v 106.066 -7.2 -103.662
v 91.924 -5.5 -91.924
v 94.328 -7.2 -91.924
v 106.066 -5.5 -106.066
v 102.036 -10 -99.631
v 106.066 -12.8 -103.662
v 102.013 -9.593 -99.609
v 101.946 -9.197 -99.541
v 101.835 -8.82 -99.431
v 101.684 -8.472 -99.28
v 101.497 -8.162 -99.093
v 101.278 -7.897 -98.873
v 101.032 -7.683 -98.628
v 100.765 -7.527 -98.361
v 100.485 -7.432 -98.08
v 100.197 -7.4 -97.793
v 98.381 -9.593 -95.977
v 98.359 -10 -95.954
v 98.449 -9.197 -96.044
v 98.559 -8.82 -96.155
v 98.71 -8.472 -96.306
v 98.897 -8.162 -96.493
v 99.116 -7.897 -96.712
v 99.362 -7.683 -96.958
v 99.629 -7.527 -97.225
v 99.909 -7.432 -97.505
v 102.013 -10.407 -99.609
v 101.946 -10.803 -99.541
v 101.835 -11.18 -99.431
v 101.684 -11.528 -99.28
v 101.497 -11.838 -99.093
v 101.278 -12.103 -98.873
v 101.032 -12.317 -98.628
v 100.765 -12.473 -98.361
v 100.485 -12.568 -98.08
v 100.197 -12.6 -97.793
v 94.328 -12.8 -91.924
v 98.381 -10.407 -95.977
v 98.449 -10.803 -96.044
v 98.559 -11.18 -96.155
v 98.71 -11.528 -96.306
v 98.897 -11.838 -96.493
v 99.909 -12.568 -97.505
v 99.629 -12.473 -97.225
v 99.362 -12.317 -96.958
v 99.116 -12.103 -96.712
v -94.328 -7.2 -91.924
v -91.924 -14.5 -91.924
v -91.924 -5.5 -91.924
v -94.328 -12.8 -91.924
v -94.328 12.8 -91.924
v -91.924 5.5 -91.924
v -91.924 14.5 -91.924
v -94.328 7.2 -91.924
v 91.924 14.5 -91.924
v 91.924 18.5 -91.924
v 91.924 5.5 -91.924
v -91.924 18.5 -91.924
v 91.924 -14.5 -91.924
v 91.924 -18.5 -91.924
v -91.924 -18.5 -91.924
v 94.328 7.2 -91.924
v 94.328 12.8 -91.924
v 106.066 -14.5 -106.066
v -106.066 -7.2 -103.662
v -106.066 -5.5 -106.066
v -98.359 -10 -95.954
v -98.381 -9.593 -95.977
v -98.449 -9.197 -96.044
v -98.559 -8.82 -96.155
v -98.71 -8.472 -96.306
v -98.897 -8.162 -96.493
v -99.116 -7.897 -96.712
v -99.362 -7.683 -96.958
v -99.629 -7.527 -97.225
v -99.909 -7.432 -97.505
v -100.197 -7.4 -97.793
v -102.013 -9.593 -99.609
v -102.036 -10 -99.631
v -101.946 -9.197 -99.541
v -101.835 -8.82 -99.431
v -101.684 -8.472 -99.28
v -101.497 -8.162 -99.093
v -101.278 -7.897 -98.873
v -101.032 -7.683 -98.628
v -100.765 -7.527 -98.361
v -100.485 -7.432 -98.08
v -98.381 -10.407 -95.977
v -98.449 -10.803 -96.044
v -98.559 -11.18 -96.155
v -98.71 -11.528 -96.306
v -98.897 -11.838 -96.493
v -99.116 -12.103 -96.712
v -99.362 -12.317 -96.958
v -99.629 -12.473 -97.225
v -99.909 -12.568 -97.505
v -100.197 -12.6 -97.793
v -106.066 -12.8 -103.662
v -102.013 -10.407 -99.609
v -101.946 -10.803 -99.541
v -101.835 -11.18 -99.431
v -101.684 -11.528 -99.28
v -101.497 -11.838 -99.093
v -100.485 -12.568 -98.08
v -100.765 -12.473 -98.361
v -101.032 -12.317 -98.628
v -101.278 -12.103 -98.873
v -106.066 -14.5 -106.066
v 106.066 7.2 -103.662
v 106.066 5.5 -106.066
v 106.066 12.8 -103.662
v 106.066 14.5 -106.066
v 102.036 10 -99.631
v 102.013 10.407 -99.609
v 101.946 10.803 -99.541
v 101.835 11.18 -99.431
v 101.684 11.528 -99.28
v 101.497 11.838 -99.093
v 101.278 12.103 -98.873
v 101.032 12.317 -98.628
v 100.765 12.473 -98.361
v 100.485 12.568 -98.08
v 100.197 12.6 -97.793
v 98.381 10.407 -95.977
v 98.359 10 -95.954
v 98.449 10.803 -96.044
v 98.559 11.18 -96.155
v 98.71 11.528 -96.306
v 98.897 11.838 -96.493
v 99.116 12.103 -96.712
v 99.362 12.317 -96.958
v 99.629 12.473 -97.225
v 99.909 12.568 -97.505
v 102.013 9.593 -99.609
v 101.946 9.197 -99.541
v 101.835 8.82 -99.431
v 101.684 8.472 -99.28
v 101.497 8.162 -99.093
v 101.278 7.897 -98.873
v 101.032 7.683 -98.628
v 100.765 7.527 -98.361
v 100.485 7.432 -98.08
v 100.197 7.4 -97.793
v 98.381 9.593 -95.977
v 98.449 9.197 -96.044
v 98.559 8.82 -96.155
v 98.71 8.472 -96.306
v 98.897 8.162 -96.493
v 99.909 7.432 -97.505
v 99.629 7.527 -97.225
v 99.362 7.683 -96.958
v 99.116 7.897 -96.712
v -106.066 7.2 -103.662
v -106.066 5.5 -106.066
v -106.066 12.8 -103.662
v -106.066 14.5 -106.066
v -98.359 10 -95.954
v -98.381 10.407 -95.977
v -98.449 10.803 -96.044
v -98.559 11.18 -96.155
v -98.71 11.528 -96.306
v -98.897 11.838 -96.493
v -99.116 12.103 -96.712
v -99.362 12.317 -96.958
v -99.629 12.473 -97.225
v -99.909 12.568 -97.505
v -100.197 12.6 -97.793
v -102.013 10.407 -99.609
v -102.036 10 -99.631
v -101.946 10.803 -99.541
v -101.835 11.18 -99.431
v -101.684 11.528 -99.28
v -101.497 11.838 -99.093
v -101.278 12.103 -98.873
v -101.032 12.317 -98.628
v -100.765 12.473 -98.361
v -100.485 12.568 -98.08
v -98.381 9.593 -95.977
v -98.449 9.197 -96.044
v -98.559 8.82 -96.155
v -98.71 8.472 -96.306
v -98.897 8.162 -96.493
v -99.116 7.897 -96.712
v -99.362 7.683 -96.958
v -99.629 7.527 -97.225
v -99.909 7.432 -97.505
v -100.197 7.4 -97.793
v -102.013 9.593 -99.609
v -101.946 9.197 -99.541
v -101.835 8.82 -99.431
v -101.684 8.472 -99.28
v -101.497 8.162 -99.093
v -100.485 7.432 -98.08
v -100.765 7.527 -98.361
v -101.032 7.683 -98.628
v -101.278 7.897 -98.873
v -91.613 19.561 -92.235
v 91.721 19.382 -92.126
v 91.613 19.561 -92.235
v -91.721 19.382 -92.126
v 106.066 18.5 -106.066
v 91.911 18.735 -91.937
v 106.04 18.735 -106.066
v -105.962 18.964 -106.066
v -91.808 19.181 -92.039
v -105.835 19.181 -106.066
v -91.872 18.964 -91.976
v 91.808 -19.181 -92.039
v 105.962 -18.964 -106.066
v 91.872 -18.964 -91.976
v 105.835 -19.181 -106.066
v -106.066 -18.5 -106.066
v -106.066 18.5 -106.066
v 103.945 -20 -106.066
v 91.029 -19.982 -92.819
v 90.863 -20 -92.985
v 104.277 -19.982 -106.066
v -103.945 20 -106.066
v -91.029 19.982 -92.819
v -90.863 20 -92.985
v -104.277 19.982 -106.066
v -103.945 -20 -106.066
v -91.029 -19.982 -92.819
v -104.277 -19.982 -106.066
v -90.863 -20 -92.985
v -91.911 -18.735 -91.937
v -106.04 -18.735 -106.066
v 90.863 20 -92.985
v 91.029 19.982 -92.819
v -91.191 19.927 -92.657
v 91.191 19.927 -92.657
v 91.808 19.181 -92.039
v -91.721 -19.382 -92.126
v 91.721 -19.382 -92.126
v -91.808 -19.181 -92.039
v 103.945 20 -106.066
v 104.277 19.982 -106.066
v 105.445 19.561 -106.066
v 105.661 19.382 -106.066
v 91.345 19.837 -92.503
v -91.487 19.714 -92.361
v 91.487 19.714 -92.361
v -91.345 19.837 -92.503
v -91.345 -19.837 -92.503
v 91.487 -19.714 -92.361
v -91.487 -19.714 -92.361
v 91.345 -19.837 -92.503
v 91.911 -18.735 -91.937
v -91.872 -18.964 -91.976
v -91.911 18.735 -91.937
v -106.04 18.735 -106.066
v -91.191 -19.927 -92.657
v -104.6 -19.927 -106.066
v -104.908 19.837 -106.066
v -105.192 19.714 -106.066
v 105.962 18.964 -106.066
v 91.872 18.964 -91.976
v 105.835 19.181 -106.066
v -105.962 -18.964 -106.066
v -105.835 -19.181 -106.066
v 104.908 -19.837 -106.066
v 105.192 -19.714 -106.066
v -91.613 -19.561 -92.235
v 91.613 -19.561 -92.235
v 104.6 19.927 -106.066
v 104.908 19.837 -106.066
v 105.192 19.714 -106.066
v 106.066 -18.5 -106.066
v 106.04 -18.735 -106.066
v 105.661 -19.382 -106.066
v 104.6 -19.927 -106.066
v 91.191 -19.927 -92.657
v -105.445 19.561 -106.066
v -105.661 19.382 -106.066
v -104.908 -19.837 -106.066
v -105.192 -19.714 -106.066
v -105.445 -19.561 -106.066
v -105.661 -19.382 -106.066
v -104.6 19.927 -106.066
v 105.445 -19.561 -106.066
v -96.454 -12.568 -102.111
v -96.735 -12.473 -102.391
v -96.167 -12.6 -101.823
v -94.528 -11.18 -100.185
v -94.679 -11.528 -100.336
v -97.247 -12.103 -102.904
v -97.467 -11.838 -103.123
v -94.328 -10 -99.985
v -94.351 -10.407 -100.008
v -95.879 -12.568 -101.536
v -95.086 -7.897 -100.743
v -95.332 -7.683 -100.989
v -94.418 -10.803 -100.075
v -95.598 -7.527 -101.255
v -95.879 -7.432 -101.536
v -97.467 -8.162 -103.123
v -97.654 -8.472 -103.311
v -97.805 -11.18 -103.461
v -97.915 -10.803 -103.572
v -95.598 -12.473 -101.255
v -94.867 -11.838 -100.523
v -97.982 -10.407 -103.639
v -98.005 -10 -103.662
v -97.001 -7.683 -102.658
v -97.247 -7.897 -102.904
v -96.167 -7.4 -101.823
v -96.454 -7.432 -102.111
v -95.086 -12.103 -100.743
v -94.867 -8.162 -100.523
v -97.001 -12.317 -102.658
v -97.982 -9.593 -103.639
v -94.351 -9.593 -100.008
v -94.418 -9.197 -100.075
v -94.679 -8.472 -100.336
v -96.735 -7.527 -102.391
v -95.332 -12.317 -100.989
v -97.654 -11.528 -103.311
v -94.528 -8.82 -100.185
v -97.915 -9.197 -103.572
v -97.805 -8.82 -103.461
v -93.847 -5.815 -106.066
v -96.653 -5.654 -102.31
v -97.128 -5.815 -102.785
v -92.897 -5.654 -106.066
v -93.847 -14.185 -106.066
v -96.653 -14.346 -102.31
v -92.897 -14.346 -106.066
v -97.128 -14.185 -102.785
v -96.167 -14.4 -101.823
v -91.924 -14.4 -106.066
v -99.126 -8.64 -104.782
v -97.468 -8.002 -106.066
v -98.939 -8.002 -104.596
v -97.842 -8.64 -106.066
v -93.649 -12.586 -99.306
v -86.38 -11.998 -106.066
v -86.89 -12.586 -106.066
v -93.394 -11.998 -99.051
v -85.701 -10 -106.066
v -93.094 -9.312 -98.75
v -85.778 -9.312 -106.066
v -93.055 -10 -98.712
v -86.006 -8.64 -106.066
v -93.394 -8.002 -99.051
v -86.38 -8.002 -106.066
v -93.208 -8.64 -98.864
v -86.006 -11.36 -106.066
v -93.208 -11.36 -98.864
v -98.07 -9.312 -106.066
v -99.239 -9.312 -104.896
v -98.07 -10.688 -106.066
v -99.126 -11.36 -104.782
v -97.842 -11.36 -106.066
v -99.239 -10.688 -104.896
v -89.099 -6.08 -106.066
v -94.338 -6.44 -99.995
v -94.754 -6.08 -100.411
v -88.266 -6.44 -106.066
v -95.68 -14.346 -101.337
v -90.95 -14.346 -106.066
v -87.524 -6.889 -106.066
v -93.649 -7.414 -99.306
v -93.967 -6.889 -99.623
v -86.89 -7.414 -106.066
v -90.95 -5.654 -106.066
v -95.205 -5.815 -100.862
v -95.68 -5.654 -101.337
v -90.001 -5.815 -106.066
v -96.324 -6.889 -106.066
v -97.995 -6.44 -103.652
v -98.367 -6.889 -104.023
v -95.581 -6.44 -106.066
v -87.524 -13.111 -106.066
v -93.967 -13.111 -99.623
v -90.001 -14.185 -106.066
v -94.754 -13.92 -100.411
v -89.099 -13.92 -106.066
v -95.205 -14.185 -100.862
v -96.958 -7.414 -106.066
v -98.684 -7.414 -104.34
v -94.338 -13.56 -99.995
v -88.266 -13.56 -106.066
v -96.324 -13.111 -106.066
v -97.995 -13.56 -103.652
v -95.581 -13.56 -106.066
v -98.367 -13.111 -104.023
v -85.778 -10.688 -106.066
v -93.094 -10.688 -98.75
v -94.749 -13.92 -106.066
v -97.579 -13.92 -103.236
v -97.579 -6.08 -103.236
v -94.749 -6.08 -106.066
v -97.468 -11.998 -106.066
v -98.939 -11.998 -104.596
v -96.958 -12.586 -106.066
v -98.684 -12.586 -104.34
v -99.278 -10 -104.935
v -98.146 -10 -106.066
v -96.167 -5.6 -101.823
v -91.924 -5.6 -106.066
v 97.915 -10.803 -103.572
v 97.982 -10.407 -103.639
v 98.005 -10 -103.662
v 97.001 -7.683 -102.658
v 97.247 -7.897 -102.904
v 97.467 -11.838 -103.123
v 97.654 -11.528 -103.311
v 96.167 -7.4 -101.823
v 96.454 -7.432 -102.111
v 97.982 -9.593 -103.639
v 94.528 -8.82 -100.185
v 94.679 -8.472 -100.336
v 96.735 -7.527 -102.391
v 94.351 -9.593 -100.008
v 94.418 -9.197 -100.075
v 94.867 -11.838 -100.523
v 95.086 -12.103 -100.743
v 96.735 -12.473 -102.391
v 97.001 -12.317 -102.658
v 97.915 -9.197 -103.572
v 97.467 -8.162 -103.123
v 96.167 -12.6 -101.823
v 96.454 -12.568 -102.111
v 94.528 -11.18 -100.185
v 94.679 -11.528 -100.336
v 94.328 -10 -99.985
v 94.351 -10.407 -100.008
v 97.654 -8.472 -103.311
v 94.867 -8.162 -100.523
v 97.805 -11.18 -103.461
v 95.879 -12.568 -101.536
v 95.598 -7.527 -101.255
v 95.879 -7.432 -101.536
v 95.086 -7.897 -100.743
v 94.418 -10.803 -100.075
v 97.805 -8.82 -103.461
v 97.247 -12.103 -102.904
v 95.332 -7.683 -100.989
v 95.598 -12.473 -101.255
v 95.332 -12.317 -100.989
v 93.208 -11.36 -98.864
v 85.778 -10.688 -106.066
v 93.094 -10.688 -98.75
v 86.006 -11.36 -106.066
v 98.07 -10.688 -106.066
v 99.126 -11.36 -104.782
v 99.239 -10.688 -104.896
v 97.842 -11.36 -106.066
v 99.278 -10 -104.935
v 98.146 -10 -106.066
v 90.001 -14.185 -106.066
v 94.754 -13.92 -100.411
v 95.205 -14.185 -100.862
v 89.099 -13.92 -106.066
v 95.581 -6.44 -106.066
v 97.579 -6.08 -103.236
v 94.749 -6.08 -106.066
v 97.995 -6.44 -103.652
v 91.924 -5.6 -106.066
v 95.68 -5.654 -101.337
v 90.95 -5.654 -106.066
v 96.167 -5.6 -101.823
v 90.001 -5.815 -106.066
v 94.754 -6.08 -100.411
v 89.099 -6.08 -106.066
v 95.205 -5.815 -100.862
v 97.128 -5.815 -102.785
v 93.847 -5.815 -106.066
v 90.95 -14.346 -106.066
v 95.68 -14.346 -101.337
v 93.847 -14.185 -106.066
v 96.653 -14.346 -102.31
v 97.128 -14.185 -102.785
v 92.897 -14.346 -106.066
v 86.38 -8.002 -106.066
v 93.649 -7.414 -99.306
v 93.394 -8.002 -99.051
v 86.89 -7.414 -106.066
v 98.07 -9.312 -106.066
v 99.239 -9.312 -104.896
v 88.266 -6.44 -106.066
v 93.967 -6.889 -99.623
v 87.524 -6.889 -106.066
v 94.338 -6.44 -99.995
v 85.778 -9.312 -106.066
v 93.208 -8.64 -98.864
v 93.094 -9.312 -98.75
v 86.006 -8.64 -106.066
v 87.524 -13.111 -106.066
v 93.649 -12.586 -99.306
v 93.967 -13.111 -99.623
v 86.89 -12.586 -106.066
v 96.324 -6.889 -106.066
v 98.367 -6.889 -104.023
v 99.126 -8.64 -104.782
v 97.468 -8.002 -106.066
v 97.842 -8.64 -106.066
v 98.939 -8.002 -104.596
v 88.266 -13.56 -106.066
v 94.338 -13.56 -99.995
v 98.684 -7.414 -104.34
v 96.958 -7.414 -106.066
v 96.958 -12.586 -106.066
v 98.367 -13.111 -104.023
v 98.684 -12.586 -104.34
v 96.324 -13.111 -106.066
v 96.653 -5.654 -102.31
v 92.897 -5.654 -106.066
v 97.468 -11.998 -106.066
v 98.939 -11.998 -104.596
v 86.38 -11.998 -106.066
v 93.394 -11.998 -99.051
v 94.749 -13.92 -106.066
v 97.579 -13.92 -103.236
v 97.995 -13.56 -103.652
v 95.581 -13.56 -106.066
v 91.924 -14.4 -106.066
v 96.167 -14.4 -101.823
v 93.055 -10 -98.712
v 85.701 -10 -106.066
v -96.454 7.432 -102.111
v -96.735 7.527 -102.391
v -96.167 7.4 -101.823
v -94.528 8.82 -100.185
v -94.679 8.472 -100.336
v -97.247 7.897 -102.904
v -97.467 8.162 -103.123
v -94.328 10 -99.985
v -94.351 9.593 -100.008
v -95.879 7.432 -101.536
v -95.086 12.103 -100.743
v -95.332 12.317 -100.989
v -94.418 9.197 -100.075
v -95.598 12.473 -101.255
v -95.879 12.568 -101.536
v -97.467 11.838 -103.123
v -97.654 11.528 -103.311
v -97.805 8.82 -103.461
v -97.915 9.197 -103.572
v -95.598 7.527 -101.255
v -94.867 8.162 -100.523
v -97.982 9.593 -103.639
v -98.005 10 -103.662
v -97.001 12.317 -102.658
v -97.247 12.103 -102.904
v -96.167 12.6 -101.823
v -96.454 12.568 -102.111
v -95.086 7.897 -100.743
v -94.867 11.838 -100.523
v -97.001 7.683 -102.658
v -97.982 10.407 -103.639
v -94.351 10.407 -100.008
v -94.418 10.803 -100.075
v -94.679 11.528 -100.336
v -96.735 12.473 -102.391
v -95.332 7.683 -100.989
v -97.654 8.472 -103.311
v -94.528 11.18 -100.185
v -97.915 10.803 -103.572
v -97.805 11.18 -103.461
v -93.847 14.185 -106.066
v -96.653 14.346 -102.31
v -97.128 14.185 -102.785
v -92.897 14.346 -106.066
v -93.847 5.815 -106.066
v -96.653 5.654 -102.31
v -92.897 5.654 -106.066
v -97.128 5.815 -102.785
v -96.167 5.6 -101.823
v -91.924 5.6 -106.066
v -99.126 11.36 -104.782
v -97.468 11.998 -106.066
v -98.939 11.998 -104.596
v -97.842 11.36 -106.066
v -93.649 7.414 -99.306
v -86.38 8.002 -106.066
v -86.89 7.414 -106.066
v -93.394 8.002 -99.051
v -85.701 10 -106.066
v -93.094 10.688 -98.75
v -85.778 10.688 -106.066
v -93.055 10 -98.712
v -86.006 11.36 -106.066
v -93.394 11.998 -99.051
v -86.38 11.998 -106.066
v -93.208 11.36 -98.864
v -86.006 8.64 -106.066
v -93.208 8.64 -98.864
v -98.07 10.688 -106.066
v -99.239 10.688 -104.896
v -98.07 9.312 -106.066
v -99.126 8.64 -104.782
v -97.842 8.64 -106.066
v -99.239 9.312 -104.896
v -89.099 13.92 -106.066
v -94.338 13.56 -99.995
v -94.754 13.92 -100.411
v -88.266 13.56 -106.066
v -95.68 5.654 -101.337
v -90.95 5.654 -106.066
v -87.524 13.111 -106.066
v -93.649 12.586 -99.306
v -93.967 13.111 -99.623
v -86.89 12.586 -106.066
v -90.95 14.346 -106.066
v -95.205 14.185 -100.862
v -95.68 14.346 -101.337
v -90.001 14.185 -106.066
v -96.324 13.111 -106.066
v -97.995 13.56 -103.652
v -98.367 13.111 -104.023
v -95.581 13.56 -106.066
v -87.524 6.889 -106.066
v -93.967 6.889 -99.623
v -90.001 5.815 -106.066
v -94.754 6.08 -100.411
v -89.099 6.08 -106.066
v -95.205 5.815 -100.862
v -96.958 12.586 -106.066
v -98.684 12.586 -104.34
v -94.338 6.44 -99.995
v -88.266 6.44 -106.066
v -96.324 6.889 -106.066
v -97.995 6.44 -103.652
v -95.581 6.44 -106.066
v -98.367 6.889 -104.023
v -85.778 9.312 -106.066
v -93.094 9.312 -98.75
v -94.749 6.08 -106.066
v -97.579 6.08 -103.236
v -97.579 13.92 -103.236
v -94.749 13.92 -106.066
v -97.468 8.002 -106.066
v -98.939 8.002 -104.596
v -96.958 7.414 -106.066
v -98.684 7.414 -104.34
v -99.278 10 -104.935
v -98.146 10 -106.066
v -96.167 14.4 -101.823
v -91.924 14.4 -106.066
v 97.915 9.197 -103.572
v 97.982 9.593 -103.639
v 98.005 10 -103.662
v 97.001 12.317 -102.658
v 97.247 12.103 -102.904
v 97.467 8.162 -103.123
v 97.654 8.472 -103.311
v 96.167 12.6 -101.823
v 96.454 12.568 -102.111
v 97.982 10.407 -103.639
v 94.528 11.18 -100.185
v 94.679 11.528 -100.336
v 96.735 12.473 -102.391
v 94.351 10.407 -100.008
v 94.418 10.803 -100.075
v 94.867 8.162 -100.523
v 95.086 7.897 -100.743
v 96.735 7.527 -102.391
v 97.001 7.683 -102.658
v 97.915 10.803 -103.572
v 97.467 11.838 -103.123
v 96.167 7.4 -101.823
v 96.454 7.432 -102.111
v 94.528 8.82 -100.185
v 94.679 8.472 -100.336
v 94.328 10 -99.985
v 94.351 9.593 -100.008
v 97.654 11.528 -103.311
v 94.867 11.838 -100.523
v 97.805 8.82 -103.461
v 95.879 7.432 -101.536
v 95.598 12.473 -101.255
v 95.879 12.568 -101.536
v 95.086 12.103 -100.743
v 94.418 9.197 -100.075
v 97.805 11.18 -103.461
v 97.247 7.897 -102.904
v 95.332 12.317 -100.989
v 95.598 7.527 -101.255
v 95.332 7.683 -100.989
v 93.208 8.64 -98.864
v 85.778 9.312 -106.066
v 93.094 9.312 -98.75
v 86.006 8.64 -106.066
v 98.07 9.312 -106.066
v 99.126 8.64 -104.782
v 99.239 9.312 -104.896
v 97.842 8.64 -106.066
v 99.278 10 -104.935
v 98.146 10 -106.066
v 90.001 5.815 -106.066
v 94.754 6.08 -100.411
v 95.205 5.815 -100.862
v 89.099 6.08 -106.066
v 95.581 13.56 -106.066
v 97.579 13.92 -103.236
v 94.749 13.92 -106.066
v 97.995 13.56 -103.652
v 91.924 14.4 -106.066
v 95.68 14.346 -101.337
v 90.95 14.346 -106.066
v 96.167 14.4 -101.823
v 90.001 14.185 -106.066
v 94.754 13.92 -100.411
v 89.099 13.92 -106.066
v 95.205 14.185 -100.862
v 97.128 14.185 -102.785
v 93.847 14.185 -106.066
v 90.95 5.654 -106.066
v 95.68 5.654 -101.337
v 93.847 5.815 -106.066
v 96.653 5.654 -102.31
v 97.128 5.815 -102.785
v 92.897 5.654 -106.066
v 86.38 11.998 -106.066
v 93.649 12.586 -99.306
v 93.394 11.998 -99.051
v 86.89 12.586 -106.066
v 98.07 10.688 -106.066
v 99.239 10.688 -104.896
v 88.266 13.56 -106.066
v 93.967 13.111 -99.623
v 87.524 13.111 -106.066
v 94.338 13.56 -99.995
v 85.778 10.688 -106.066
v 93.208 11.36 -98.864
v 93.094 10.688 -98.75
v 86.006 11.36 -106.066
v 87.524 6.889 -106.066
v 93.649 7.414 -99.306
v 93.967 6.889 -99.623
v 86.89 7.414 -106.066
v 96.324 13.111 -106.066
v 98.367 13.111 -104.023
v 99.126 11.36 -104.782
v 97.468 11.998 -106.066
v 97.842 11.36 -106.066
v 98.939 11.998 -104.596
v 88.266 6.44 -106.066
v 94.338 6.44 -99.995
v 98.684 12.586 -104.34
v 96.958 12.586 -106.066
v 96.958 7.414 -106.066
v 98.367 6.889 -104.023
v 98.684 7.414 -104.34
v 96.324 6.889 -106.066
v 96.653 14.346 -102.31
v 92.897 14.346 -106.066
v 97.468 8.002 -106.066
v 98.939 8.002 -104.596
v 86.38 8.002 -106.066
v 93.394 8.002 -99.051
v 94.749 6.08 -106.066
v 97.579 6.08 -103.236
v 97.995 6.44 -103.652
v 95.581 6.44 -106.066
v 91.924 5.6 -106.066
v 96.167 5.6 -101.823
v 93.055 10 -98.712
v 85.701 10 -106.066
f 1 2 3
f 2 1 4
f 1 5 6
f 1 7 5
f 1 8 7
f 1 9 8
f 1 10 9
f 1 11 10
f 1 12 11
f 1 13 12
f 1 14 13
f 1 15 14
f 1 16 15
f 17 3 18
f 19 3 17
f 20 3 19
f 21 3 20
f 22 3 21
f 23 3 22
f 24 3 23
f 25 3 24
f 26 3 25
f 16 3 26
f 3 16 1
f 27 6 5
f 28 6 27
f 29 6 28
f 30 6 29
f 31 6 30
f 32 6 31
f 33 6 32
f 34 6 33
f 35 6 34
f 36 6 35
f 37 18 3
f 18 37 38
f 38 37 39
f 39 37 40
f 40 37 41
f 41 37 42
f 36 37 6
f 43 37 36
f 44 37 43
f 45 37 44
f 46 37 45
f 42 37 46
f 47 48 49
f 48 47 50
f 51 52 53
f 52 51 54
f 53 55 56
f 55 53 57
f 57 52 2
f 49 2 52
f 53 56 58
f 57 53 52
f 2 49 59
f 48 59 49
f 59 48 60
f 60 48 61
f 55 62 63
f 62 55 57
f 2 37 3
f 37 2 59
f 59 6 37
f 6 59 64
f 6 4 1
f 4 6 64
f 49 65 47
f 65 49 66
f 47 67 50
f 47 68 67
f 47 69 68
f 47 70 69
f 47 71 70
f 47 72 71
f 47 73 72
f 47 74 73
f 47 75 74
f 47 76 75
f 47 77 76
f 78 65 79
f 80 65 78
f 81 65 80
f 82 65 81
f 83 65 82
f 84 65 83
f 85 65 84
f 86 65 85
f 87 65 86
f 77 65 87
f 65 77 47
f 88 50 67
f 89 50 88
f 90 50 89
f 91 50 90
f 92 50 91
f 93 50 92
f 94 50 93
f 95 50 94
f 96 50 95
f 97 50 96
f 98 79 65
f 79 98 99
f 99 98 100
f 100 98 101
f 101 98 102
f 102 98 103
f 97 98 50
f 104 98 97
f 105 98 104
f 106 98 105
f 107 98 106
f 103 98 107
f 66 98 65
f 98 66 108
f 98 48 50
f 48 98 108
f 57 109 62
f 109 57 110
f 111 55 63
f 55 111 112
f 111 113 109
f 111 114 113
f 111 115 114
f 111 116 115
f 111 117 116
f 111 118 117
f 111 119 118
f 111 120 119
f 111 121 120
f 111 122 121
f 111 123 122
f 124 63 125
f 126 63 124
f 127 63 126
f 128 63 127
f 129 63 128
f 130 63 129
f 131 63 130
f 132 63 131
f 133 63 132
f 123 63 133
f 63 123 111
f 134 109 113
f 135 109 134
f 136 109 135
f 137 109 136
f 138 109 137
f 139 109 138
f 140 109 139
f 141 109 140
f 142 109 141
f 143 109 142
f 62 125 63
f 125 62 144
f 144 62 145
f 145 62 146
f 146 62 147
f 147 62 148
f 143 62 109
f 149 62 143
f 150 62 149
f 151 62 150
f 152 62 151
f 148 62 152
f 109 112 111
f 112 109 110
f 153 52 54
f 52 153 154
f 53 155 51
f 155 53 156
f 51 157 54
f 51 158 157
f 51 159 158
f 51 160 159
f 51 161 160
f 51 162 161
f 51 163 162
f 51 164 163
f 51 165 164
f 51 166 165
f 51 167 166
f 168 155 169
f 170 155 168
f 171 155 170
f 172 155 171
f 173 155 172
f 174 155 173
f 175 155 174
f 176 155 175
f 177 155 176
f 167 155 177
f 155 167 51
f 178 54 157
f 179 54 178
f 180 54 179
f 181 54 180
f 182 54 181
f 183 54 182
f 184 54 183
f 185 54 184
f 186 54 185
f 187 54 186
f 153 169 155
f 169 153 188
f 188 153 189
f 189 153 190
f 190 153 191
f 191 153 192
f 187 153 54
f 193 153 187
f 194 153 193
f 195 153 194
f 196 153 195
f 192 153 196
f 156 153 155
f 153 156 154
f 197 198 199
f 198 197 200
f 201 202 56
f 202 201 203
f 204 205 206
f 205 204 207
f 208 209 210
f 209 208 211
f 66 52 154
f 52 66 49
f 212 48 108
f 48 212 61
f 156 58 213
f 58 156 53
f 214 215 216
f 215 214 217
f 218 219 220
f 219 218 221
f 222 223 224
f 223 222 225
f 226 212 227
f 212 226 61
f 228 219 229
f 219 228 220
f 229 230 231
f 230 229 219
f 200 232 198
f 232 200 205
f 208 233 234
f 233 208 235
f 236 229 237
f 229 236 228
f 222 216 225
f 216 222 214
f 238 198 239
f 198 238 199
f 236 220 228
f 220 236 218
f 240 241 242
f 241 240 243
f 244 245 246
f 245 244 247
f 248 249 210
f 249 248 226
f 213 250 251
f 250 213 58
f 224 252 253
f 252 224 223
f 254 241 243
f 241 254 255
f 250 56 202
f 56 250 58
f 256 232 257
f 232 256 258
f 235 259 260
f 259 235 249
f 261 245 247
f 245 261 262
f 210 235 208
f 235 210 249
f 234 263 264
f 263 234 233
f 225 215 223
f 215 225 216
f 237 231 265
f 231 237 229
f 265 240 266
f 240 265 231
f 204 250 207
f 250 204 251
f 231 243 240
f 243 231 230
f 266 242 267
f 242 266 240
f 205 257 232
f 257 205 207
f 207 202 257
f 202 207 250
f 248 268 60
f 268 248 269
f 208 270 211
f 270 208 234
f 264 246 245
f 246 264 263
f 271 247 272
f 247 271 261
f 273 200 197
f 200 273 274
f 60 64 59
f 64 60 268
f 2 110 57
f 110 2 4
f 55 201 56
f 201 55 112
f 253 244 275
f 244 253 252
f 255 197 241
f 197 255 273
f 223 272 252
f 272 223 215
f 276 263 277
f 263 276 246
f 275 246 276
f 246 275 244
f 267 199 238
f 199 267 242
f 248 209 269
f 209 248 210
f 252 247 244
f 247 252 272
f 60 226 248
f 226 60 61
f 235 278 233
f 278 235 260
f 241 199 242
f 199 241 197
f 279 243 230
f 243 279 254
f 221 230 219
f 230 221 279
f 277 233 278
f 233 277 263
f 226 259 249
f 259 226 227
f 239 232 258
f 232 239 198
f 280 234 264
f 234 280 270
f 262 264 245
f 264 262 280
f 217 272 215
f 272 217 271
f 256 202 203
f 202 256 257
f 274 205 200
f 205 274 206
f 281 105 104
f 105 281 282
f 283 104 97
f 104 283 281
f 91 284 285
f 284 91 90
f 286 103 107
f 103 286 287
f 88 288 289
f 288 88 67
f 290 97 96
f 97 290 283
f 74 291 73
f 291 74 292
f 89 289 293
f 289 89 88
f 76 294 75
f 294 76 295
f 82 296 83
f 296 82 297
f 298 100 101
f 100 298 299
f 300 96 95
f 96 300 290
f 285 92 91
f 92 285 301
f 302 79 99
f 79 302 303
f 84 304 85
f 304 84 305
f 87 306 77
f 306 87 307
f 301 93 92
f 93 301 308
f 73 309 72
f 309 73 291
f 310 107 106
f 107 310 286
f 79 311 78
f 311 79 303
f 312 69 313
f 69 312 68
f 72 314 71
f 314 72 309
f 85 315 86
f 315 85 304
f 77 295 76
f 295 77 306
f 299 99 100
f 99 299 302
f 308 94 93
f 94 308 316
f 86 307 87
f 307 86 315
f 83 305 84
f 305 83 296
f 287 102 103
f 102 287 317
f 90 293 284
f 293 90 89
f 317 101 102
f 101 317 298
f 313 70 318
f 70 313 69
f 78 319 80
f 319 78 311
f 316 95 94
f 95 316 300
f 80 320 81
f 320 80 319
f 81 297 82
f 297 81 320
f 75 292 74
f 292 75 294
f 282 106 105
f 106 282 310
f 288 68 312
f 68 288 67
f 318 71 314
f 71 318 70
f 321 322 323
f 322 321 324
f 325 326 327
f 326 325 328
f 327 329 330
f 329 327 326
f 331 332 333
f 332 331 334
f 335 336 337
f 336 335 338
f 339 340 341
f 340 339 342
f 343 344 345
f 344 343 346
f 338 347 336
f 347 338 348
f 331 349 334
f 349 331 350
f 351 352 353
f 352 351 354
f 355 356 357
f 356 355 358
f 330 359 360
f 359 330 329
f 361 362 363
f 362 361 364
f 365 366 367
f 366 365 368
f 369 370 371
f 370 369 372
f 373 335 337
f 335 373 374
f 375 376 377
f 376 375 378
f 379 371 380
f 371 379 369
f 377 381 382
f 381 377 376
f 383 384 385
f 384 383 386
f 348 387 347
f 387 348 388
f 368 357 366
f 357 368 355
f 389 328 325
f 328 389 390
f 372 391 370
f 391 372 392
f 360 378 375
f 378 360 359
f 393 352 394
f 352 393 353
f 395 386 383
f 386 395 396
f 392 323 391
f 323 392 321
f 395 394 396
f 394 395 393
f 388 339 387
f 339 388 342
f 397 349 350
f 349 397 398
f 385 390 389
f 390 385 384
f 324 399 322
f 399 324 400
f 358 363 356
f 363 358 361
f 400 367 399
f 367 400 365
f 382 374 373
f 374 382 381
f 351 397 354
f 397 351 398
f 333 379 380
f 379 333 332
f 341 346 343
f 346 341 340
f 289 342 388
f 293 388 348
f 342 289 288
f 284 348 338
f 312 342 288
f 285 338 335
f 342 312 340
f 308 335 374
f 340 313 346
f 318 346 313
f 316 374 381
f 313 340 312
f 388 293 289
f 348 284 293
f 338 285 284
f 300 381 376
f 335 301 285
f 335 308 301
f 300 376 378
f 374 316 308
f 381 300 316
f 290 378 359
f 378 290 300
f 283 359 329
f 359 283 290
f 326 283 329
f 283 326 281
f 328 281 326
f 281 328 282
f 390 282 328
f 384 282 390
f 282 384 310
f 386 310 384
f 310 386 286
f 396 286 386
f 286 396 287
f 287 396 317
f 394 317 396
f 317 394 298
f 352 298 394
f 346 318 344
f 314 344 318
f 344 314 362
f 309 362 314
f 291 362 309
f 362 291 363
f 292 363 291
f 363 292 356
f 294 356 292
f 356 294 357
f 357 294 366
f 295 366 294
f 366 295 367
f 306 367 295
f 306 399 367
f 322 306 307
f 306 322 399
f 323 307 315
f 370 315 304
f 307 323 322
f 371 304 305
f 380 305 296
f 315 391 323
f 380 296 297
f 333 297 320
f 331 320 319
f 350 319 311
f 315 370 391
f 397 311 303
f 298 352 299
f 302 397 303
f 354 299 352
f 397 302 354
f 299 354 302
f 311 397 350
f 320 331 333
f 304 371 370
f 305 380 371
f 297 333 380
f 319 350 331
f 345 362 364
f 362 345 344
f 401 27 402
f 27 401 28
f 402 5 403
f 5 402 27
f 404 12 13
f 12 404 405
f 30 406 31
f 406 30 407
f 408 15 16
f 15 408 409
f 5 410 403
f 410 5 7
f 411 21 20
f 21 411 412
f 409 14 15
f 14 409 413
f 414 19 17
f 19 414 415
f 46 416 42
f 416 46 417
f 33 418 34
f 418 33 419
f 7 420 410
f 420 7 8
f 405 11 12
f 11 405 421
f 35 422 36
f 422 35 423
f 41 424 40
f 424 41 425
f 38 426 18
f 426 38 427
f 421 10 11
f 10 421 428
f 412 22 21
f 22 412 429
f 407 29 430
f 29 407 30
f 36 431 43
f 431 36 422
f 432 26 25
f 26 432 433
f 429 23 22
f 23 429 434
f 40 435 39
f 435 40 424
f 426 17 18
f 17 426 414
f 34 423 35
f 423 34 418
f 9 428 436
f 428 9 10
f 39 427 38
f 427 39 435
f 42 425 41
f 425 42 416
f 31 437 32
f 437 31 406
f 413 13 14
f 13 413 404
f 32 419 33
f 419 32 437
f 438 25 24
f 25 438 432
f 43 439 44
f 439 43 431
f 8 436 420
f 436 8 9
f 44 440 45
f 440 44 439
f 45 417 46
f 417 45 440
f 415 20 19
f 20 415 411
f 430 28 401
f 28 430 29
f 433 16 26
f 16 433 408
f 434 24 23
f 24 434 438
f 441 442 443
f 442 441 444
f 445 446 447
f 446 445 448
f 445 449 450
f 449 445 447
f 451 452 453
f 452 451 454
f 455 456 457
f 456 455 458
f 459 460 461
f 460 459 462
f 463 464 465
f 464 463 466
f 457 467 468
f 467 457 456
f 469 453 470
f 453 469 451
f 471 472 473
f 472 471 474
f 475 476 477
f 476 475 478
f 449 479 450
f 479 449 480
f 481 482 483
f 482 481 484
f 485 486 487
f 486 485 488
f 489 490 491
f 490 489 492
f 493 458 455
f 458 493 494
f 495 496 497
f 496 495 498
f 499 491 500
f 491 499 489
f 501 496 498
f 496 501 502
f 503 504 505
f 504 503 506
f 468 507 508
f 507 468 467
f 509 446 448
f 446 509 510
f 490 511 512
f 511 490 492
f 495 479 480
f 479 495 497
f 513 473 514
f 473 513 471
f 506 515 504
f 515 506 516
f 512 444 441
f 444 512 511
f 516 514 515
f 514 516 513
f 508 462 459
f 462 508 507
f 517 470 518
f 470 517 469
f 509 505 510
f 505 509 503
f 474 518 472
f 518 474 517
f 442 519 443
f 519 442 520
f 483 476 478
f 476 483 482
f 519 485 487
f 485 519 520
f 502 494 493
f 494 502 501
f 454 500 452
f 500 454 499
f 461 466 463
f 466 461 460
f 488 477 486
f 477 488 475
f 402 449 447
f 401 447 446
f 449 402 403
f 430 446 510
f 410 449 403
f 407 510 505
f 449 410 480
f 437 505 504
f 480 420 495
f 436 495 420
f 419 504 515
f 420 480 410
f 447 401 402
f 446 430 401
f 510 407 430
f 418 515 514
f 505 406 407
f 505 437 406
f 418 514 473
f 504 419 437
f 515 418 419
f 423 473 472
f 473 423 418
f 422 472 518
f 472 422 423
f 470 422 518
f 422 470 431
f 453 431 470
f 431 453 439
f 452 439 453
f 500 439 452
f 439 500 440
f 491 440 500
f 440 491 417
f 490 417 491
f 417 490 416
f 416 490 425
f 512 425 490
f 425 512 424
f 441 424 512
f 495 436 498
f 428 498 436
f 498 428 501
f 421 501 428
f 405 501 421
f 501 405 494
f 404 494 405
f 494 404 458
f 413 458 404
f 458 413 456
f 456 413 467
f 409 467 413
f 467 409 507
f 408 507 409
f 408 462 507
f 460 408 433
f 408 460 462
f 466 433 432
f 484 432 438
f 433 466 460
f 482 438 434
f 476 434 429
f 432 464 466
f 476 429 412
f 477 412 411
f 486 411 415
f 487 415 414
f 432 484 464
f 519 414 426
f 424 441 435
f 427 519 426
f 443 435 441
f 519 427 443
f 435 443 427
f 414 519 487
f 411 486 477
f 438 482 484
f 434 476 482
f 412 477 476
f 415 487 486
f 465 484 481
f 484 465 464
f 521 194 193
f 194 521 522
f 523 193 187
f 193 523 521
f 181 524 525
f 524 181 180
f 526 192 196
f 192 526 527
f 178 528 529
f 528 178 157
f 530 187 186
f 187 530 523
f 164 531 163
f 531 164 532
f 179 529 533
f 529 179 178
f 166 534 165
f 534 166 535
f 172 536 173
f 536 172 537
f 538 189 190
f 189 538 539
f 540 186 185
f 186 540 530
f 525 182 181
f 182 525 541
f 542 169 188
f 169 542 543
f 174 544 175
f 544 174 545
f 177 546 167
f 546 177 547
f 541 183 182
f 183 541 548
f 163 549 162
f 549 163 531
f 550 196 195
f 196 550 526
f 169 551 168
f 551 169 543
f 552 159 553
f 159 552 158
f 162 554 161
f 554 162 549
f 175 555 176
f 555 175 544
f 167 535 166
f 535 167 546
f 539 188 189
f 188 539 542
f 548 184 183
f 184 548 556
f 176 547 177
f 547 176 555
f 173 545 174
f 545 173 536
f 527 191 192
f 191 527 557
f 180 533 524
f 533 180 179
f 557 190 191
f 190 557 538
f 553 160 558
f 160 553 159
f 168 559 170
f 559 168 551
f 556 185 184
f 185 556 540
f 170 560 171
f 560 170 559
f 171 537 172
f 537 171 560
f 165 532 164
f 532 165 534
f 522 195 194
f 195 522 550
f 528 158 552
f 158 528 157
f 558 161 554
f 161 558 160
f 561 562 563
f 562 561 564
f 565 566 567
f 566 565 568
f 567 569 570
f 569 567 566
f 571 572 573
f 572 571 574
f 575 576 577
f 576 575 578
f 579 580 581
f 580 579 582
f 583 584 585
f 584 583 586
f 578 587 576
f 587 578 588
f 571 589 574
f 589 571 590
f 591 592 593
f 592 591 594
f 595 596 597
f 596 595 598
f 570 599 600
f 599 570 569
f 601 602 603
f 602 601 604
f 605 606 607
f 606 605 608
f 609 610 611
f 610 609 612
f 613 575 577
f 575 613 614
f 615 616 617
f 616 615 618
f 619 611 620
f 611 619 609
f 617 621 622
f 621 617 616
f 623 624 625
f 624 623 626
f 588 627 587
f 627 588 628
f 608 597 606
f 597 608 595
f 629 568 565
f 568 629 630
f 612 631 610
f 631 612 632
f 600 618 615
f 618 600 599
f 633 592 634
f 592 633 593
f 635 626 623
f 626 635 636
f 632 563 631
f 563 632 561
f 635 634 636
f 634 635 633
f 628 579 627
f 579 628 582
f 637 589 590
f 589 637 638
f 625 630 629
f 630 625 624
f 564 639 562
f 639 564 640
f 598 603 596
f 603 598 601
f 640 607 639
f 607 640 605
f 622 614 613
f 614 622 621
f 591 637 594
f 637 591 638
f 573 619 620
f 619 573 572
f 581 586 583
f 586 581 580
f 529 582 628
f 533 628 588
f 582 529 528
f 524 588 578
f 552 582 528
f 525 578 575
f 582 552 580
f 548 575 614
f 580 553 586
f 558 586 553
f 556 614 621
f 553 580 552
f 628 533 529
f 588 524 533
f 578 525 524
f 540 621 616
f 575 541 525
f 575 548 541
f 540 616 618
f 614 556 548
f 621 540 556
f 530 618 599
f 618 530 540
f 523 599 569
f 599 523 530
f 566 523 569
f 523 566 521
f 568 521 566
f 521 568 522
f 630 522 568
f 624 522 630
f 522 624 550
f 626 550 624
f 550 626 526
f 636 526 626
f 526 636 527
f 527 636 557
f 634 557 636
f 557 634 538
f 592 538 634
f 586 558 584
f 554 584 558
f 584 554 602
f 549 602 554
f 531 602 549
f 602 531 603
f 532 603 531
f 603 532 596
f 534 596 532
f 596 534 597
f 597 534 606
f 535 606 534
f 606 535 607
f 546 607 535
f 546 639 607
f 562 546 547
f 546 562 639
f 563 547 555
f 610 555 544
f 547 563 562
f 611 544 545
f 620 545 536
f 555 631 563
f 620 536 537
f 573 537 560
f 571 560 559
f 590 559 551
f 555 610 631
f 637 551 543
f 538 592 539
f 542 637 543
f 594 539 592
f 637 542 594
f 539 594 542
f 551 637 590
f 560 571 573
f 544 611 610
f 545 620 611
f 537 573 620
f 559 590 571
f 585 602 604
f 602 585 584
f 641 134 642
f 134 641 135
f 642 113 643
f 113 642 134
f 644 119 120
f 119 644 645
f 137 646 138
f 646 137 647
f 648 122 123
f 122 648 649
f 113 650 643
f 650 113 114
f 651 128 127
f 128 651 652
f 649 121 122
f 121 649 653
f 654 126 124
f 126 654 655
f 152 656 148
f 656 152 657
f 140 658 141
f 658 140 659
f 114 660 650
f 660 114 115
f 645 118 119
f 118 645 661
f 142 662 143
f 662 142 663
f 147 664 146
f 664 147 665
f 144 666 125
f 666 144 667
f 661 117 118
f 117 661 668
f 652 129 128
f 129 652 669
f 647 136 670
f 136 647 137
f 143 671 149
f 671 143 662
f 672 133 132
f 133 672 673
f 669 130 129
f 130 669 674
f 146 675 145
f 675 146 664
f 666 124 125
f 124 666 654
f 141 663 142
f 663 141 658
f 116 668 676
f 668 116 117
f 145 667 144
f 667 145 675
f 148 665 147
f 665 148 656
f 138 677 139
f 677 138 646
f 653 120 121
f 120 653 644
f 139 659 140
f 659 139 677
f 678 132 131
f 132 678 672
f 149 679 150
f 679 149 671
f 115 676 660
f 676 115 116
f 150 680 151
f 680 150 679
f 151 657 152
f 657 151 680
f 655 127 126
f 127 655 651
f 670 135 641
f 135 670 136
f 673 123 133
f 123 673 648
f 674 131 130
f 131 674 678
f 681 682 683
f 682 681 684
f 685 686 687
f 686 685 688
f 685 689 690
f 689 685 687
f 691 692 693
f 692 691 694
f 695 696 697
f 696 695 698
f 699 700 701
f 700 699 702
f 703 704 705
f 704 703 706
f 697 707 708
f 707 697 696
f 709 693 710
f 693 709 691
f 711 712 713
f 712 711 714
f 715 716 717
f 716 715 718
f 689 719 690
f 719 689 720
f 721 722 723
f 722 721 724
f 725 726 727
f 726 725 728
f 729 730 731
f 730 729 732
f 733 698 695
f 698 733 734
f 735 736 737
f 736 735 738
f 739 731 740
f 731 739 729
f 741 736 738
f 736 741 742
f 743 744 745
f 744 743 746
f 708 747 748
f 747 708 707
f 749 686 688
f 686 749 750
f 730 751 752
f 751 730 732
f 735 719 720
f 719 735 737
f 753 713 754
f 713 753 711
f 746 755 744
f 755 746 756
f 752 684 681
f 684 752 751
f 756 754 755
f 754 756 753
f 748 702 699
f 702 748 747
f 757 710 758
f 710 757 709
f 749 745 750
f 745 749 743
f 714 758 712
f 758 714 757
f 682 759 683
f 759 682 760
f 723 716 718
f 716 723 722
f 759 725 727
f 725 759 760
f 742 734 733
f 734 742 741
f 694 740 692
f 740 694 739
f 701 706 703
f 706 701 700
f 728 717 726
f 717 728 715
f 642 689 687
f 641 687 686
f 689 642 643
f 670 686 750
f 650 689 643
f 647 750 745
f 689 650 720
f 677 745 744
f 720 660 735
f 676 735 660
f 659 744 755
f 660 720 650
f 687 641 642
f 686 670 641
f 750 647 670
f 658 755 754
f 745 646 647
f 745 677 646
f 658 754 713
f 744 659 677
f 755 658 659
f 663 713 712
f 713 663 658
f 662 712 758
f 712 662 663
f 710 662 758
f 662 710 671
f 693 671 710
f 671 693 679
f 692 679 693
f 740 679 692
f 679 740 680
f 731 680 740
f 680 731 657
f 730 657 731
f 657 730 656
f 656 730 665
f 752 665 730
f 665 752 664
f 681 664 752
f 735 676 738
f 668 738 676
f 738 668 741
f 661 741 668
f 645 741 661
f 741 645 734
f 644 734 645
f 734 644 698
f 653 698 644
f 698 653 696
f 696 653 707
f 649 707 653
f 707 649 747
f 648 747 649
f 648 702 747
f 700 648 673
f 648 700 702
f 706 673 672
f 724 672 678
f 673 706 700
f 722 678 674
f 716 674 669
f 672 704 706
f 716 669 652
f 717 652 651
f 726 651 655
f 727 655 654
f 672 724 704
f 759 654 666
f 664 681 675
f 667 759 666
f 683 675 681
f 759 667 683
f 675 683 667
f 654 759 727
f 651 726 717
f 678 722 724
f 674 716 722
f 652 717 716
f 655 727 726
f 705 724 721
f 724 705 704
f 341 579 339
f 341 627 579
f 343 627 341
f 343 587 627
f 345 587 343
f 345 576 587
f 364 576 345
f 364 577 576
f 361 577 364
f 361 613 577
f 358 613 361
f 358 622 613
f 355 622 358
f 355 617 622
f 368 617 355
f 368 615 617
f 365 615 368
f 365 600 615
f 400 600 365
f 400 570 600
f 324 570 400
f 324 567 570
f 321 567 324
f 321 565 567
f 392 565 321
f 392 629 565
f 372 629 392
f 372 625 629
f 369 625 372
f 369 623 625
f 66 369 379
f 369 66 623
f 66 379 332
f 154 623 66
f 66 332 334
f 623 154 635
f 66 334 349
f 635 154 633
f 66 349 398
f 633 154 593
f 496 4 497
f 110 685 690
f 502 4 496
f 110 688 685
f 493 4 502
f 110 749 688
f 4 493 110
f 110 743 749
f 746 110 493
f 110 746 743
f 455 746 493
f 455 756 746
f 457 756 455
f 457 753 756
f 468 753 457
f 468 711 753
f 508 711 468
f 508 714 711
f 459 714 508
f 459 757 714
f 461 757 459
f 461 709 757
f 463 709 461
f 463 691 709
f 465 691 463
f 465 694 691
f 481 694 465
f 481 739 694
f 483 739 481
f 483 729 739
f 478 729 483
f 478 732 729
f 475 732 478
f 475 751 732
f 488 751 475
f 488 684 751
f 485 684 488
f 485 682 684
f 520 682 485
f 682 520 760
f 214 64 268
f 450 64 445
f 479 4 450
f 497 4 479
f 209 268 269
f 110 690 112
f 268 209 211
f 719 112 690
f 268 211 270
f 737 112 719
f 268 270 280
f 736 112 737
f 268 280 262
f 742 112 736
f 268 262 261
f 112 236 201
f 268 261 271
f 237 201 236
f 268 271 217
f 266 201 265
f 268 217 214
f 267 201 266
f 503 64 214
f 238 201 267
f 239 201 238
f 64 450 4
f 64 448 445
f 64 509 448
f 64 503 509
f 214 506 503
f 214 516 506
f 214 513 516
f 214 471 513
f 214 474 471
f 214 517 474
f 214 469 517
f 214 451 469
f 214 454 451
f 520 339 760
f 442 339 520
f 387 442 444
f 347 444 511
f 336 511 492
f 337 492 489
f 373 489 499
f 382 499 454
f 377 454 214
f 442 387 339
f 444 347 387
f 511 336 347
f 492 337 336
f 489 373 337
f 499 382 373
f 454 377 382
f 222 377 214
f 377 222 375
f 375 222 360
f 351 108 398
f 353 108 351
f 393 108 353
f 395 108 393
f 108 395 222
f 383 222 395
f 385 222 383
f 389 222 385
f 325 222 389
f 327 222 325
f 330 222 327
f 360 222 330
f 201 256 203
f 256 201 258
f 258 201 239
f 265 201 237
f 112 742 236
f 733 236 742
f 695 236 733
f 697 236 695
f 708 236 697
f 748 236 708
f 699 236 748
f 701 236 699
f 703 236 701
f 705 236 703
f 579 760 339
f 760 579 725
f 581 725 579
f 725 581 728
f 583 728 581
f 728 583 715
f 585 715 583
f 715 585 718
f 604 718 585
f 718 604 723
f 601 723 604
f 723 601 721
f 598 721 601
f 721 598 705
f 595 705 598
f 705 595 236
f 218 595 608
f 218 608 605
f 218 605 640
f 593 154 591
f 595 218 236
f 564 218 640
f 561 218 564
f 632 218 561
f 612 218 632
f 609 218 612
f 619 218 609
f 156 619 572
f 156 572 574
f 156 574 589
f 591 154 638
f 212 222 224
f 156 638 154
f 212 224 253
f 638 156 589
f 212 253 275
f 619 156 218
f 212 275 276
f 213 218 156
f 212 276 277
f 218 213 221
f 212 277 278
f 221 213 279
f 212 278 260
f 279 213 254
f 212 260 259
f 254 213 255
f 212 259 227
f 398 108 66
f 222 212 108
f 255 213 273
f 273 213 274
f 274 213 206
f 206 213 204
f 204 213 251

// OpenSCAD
d1=150;//[20:1:300]
d2=150;//[30:1:300]
mw=20;//[15:1:50]
profil=2;//[1:20x20,2:20x40,3:20x60,4:20x80]

render(profil);

$fn=40;
function x1()=(d1<=d2)? mw:d1-d1*((d2-mw)/d2);
function x2()=(d1>=d2)? mw:d2-d2*((d1-mw)/d1);
echo("x1=",x1());
echo("x2=",x2());      


module pre_hull(a,b) {
    intersection() {
        cube([a,4,b*20],center=true);
        rotate([0,90,0]) hull() {for(i=[-1,1],j=[-0.5,5]) translate([i*8.5+i*(b-1)*10,j,0]) cylinder(d=3,h=a,center=true);}
    }
}
module slot(a) {
    translate([-a/2,-2,0]) hull() {
        translate([0,0,-4.5]) cube([a,4,9]);
        translate([1.7,-1.7,-2.8]) cube([a-2*1.7,5.7,5.6]);
    }
}
module V_slot_angle(b) {
    difference() {
        union() {
            hull() {
                translate([d1-x1()/2,2,0]) pre_hull(x1(),b);
                translate([2,d2-x2()/2,0]) rotate([0,0,-90]) pre_hull(x2(),b);
            }
            for(i=[1:1:b]) translate([0,0,(i-1)*20-(b-1)*10]) {
                translate([d1-x1()/2,2,0]) slot(x1());
                translate([2,d2-x2()/2,0]) rotate([0,0,-90]) slot(x2());
            }
        }
        for(i=[1:1:b]) translate([0,0,(i-1)*20-(b-1)*10]) {
            translate([2,d2-x2()/2,0]) rotate([0,90,0]) {
                cylinder(d=5.2,h=40,center=true);
                translate([0,0,2]) cylinder(d=8.8,h=50);
            }
            translate([d1-x1()/2,2,0]) rotate([-90,0,0]) {
                cylinder(d=5.2,h=40,center=true);
                translate([0,0,2]) cylinder(d=8.8,h=50);
            }
        }
        linear_extrude(height = b*22, center = true, convexity = 10, twist = 0)polygon(points=[[d1,0],[0,d2],[0,d2+40],[d1+40,0]]);

    }
}

module render(a) {
    rotate([-90,0,0]) rotate([0,0,atan(d2/d1)]) V_slot_angle(a);
}
